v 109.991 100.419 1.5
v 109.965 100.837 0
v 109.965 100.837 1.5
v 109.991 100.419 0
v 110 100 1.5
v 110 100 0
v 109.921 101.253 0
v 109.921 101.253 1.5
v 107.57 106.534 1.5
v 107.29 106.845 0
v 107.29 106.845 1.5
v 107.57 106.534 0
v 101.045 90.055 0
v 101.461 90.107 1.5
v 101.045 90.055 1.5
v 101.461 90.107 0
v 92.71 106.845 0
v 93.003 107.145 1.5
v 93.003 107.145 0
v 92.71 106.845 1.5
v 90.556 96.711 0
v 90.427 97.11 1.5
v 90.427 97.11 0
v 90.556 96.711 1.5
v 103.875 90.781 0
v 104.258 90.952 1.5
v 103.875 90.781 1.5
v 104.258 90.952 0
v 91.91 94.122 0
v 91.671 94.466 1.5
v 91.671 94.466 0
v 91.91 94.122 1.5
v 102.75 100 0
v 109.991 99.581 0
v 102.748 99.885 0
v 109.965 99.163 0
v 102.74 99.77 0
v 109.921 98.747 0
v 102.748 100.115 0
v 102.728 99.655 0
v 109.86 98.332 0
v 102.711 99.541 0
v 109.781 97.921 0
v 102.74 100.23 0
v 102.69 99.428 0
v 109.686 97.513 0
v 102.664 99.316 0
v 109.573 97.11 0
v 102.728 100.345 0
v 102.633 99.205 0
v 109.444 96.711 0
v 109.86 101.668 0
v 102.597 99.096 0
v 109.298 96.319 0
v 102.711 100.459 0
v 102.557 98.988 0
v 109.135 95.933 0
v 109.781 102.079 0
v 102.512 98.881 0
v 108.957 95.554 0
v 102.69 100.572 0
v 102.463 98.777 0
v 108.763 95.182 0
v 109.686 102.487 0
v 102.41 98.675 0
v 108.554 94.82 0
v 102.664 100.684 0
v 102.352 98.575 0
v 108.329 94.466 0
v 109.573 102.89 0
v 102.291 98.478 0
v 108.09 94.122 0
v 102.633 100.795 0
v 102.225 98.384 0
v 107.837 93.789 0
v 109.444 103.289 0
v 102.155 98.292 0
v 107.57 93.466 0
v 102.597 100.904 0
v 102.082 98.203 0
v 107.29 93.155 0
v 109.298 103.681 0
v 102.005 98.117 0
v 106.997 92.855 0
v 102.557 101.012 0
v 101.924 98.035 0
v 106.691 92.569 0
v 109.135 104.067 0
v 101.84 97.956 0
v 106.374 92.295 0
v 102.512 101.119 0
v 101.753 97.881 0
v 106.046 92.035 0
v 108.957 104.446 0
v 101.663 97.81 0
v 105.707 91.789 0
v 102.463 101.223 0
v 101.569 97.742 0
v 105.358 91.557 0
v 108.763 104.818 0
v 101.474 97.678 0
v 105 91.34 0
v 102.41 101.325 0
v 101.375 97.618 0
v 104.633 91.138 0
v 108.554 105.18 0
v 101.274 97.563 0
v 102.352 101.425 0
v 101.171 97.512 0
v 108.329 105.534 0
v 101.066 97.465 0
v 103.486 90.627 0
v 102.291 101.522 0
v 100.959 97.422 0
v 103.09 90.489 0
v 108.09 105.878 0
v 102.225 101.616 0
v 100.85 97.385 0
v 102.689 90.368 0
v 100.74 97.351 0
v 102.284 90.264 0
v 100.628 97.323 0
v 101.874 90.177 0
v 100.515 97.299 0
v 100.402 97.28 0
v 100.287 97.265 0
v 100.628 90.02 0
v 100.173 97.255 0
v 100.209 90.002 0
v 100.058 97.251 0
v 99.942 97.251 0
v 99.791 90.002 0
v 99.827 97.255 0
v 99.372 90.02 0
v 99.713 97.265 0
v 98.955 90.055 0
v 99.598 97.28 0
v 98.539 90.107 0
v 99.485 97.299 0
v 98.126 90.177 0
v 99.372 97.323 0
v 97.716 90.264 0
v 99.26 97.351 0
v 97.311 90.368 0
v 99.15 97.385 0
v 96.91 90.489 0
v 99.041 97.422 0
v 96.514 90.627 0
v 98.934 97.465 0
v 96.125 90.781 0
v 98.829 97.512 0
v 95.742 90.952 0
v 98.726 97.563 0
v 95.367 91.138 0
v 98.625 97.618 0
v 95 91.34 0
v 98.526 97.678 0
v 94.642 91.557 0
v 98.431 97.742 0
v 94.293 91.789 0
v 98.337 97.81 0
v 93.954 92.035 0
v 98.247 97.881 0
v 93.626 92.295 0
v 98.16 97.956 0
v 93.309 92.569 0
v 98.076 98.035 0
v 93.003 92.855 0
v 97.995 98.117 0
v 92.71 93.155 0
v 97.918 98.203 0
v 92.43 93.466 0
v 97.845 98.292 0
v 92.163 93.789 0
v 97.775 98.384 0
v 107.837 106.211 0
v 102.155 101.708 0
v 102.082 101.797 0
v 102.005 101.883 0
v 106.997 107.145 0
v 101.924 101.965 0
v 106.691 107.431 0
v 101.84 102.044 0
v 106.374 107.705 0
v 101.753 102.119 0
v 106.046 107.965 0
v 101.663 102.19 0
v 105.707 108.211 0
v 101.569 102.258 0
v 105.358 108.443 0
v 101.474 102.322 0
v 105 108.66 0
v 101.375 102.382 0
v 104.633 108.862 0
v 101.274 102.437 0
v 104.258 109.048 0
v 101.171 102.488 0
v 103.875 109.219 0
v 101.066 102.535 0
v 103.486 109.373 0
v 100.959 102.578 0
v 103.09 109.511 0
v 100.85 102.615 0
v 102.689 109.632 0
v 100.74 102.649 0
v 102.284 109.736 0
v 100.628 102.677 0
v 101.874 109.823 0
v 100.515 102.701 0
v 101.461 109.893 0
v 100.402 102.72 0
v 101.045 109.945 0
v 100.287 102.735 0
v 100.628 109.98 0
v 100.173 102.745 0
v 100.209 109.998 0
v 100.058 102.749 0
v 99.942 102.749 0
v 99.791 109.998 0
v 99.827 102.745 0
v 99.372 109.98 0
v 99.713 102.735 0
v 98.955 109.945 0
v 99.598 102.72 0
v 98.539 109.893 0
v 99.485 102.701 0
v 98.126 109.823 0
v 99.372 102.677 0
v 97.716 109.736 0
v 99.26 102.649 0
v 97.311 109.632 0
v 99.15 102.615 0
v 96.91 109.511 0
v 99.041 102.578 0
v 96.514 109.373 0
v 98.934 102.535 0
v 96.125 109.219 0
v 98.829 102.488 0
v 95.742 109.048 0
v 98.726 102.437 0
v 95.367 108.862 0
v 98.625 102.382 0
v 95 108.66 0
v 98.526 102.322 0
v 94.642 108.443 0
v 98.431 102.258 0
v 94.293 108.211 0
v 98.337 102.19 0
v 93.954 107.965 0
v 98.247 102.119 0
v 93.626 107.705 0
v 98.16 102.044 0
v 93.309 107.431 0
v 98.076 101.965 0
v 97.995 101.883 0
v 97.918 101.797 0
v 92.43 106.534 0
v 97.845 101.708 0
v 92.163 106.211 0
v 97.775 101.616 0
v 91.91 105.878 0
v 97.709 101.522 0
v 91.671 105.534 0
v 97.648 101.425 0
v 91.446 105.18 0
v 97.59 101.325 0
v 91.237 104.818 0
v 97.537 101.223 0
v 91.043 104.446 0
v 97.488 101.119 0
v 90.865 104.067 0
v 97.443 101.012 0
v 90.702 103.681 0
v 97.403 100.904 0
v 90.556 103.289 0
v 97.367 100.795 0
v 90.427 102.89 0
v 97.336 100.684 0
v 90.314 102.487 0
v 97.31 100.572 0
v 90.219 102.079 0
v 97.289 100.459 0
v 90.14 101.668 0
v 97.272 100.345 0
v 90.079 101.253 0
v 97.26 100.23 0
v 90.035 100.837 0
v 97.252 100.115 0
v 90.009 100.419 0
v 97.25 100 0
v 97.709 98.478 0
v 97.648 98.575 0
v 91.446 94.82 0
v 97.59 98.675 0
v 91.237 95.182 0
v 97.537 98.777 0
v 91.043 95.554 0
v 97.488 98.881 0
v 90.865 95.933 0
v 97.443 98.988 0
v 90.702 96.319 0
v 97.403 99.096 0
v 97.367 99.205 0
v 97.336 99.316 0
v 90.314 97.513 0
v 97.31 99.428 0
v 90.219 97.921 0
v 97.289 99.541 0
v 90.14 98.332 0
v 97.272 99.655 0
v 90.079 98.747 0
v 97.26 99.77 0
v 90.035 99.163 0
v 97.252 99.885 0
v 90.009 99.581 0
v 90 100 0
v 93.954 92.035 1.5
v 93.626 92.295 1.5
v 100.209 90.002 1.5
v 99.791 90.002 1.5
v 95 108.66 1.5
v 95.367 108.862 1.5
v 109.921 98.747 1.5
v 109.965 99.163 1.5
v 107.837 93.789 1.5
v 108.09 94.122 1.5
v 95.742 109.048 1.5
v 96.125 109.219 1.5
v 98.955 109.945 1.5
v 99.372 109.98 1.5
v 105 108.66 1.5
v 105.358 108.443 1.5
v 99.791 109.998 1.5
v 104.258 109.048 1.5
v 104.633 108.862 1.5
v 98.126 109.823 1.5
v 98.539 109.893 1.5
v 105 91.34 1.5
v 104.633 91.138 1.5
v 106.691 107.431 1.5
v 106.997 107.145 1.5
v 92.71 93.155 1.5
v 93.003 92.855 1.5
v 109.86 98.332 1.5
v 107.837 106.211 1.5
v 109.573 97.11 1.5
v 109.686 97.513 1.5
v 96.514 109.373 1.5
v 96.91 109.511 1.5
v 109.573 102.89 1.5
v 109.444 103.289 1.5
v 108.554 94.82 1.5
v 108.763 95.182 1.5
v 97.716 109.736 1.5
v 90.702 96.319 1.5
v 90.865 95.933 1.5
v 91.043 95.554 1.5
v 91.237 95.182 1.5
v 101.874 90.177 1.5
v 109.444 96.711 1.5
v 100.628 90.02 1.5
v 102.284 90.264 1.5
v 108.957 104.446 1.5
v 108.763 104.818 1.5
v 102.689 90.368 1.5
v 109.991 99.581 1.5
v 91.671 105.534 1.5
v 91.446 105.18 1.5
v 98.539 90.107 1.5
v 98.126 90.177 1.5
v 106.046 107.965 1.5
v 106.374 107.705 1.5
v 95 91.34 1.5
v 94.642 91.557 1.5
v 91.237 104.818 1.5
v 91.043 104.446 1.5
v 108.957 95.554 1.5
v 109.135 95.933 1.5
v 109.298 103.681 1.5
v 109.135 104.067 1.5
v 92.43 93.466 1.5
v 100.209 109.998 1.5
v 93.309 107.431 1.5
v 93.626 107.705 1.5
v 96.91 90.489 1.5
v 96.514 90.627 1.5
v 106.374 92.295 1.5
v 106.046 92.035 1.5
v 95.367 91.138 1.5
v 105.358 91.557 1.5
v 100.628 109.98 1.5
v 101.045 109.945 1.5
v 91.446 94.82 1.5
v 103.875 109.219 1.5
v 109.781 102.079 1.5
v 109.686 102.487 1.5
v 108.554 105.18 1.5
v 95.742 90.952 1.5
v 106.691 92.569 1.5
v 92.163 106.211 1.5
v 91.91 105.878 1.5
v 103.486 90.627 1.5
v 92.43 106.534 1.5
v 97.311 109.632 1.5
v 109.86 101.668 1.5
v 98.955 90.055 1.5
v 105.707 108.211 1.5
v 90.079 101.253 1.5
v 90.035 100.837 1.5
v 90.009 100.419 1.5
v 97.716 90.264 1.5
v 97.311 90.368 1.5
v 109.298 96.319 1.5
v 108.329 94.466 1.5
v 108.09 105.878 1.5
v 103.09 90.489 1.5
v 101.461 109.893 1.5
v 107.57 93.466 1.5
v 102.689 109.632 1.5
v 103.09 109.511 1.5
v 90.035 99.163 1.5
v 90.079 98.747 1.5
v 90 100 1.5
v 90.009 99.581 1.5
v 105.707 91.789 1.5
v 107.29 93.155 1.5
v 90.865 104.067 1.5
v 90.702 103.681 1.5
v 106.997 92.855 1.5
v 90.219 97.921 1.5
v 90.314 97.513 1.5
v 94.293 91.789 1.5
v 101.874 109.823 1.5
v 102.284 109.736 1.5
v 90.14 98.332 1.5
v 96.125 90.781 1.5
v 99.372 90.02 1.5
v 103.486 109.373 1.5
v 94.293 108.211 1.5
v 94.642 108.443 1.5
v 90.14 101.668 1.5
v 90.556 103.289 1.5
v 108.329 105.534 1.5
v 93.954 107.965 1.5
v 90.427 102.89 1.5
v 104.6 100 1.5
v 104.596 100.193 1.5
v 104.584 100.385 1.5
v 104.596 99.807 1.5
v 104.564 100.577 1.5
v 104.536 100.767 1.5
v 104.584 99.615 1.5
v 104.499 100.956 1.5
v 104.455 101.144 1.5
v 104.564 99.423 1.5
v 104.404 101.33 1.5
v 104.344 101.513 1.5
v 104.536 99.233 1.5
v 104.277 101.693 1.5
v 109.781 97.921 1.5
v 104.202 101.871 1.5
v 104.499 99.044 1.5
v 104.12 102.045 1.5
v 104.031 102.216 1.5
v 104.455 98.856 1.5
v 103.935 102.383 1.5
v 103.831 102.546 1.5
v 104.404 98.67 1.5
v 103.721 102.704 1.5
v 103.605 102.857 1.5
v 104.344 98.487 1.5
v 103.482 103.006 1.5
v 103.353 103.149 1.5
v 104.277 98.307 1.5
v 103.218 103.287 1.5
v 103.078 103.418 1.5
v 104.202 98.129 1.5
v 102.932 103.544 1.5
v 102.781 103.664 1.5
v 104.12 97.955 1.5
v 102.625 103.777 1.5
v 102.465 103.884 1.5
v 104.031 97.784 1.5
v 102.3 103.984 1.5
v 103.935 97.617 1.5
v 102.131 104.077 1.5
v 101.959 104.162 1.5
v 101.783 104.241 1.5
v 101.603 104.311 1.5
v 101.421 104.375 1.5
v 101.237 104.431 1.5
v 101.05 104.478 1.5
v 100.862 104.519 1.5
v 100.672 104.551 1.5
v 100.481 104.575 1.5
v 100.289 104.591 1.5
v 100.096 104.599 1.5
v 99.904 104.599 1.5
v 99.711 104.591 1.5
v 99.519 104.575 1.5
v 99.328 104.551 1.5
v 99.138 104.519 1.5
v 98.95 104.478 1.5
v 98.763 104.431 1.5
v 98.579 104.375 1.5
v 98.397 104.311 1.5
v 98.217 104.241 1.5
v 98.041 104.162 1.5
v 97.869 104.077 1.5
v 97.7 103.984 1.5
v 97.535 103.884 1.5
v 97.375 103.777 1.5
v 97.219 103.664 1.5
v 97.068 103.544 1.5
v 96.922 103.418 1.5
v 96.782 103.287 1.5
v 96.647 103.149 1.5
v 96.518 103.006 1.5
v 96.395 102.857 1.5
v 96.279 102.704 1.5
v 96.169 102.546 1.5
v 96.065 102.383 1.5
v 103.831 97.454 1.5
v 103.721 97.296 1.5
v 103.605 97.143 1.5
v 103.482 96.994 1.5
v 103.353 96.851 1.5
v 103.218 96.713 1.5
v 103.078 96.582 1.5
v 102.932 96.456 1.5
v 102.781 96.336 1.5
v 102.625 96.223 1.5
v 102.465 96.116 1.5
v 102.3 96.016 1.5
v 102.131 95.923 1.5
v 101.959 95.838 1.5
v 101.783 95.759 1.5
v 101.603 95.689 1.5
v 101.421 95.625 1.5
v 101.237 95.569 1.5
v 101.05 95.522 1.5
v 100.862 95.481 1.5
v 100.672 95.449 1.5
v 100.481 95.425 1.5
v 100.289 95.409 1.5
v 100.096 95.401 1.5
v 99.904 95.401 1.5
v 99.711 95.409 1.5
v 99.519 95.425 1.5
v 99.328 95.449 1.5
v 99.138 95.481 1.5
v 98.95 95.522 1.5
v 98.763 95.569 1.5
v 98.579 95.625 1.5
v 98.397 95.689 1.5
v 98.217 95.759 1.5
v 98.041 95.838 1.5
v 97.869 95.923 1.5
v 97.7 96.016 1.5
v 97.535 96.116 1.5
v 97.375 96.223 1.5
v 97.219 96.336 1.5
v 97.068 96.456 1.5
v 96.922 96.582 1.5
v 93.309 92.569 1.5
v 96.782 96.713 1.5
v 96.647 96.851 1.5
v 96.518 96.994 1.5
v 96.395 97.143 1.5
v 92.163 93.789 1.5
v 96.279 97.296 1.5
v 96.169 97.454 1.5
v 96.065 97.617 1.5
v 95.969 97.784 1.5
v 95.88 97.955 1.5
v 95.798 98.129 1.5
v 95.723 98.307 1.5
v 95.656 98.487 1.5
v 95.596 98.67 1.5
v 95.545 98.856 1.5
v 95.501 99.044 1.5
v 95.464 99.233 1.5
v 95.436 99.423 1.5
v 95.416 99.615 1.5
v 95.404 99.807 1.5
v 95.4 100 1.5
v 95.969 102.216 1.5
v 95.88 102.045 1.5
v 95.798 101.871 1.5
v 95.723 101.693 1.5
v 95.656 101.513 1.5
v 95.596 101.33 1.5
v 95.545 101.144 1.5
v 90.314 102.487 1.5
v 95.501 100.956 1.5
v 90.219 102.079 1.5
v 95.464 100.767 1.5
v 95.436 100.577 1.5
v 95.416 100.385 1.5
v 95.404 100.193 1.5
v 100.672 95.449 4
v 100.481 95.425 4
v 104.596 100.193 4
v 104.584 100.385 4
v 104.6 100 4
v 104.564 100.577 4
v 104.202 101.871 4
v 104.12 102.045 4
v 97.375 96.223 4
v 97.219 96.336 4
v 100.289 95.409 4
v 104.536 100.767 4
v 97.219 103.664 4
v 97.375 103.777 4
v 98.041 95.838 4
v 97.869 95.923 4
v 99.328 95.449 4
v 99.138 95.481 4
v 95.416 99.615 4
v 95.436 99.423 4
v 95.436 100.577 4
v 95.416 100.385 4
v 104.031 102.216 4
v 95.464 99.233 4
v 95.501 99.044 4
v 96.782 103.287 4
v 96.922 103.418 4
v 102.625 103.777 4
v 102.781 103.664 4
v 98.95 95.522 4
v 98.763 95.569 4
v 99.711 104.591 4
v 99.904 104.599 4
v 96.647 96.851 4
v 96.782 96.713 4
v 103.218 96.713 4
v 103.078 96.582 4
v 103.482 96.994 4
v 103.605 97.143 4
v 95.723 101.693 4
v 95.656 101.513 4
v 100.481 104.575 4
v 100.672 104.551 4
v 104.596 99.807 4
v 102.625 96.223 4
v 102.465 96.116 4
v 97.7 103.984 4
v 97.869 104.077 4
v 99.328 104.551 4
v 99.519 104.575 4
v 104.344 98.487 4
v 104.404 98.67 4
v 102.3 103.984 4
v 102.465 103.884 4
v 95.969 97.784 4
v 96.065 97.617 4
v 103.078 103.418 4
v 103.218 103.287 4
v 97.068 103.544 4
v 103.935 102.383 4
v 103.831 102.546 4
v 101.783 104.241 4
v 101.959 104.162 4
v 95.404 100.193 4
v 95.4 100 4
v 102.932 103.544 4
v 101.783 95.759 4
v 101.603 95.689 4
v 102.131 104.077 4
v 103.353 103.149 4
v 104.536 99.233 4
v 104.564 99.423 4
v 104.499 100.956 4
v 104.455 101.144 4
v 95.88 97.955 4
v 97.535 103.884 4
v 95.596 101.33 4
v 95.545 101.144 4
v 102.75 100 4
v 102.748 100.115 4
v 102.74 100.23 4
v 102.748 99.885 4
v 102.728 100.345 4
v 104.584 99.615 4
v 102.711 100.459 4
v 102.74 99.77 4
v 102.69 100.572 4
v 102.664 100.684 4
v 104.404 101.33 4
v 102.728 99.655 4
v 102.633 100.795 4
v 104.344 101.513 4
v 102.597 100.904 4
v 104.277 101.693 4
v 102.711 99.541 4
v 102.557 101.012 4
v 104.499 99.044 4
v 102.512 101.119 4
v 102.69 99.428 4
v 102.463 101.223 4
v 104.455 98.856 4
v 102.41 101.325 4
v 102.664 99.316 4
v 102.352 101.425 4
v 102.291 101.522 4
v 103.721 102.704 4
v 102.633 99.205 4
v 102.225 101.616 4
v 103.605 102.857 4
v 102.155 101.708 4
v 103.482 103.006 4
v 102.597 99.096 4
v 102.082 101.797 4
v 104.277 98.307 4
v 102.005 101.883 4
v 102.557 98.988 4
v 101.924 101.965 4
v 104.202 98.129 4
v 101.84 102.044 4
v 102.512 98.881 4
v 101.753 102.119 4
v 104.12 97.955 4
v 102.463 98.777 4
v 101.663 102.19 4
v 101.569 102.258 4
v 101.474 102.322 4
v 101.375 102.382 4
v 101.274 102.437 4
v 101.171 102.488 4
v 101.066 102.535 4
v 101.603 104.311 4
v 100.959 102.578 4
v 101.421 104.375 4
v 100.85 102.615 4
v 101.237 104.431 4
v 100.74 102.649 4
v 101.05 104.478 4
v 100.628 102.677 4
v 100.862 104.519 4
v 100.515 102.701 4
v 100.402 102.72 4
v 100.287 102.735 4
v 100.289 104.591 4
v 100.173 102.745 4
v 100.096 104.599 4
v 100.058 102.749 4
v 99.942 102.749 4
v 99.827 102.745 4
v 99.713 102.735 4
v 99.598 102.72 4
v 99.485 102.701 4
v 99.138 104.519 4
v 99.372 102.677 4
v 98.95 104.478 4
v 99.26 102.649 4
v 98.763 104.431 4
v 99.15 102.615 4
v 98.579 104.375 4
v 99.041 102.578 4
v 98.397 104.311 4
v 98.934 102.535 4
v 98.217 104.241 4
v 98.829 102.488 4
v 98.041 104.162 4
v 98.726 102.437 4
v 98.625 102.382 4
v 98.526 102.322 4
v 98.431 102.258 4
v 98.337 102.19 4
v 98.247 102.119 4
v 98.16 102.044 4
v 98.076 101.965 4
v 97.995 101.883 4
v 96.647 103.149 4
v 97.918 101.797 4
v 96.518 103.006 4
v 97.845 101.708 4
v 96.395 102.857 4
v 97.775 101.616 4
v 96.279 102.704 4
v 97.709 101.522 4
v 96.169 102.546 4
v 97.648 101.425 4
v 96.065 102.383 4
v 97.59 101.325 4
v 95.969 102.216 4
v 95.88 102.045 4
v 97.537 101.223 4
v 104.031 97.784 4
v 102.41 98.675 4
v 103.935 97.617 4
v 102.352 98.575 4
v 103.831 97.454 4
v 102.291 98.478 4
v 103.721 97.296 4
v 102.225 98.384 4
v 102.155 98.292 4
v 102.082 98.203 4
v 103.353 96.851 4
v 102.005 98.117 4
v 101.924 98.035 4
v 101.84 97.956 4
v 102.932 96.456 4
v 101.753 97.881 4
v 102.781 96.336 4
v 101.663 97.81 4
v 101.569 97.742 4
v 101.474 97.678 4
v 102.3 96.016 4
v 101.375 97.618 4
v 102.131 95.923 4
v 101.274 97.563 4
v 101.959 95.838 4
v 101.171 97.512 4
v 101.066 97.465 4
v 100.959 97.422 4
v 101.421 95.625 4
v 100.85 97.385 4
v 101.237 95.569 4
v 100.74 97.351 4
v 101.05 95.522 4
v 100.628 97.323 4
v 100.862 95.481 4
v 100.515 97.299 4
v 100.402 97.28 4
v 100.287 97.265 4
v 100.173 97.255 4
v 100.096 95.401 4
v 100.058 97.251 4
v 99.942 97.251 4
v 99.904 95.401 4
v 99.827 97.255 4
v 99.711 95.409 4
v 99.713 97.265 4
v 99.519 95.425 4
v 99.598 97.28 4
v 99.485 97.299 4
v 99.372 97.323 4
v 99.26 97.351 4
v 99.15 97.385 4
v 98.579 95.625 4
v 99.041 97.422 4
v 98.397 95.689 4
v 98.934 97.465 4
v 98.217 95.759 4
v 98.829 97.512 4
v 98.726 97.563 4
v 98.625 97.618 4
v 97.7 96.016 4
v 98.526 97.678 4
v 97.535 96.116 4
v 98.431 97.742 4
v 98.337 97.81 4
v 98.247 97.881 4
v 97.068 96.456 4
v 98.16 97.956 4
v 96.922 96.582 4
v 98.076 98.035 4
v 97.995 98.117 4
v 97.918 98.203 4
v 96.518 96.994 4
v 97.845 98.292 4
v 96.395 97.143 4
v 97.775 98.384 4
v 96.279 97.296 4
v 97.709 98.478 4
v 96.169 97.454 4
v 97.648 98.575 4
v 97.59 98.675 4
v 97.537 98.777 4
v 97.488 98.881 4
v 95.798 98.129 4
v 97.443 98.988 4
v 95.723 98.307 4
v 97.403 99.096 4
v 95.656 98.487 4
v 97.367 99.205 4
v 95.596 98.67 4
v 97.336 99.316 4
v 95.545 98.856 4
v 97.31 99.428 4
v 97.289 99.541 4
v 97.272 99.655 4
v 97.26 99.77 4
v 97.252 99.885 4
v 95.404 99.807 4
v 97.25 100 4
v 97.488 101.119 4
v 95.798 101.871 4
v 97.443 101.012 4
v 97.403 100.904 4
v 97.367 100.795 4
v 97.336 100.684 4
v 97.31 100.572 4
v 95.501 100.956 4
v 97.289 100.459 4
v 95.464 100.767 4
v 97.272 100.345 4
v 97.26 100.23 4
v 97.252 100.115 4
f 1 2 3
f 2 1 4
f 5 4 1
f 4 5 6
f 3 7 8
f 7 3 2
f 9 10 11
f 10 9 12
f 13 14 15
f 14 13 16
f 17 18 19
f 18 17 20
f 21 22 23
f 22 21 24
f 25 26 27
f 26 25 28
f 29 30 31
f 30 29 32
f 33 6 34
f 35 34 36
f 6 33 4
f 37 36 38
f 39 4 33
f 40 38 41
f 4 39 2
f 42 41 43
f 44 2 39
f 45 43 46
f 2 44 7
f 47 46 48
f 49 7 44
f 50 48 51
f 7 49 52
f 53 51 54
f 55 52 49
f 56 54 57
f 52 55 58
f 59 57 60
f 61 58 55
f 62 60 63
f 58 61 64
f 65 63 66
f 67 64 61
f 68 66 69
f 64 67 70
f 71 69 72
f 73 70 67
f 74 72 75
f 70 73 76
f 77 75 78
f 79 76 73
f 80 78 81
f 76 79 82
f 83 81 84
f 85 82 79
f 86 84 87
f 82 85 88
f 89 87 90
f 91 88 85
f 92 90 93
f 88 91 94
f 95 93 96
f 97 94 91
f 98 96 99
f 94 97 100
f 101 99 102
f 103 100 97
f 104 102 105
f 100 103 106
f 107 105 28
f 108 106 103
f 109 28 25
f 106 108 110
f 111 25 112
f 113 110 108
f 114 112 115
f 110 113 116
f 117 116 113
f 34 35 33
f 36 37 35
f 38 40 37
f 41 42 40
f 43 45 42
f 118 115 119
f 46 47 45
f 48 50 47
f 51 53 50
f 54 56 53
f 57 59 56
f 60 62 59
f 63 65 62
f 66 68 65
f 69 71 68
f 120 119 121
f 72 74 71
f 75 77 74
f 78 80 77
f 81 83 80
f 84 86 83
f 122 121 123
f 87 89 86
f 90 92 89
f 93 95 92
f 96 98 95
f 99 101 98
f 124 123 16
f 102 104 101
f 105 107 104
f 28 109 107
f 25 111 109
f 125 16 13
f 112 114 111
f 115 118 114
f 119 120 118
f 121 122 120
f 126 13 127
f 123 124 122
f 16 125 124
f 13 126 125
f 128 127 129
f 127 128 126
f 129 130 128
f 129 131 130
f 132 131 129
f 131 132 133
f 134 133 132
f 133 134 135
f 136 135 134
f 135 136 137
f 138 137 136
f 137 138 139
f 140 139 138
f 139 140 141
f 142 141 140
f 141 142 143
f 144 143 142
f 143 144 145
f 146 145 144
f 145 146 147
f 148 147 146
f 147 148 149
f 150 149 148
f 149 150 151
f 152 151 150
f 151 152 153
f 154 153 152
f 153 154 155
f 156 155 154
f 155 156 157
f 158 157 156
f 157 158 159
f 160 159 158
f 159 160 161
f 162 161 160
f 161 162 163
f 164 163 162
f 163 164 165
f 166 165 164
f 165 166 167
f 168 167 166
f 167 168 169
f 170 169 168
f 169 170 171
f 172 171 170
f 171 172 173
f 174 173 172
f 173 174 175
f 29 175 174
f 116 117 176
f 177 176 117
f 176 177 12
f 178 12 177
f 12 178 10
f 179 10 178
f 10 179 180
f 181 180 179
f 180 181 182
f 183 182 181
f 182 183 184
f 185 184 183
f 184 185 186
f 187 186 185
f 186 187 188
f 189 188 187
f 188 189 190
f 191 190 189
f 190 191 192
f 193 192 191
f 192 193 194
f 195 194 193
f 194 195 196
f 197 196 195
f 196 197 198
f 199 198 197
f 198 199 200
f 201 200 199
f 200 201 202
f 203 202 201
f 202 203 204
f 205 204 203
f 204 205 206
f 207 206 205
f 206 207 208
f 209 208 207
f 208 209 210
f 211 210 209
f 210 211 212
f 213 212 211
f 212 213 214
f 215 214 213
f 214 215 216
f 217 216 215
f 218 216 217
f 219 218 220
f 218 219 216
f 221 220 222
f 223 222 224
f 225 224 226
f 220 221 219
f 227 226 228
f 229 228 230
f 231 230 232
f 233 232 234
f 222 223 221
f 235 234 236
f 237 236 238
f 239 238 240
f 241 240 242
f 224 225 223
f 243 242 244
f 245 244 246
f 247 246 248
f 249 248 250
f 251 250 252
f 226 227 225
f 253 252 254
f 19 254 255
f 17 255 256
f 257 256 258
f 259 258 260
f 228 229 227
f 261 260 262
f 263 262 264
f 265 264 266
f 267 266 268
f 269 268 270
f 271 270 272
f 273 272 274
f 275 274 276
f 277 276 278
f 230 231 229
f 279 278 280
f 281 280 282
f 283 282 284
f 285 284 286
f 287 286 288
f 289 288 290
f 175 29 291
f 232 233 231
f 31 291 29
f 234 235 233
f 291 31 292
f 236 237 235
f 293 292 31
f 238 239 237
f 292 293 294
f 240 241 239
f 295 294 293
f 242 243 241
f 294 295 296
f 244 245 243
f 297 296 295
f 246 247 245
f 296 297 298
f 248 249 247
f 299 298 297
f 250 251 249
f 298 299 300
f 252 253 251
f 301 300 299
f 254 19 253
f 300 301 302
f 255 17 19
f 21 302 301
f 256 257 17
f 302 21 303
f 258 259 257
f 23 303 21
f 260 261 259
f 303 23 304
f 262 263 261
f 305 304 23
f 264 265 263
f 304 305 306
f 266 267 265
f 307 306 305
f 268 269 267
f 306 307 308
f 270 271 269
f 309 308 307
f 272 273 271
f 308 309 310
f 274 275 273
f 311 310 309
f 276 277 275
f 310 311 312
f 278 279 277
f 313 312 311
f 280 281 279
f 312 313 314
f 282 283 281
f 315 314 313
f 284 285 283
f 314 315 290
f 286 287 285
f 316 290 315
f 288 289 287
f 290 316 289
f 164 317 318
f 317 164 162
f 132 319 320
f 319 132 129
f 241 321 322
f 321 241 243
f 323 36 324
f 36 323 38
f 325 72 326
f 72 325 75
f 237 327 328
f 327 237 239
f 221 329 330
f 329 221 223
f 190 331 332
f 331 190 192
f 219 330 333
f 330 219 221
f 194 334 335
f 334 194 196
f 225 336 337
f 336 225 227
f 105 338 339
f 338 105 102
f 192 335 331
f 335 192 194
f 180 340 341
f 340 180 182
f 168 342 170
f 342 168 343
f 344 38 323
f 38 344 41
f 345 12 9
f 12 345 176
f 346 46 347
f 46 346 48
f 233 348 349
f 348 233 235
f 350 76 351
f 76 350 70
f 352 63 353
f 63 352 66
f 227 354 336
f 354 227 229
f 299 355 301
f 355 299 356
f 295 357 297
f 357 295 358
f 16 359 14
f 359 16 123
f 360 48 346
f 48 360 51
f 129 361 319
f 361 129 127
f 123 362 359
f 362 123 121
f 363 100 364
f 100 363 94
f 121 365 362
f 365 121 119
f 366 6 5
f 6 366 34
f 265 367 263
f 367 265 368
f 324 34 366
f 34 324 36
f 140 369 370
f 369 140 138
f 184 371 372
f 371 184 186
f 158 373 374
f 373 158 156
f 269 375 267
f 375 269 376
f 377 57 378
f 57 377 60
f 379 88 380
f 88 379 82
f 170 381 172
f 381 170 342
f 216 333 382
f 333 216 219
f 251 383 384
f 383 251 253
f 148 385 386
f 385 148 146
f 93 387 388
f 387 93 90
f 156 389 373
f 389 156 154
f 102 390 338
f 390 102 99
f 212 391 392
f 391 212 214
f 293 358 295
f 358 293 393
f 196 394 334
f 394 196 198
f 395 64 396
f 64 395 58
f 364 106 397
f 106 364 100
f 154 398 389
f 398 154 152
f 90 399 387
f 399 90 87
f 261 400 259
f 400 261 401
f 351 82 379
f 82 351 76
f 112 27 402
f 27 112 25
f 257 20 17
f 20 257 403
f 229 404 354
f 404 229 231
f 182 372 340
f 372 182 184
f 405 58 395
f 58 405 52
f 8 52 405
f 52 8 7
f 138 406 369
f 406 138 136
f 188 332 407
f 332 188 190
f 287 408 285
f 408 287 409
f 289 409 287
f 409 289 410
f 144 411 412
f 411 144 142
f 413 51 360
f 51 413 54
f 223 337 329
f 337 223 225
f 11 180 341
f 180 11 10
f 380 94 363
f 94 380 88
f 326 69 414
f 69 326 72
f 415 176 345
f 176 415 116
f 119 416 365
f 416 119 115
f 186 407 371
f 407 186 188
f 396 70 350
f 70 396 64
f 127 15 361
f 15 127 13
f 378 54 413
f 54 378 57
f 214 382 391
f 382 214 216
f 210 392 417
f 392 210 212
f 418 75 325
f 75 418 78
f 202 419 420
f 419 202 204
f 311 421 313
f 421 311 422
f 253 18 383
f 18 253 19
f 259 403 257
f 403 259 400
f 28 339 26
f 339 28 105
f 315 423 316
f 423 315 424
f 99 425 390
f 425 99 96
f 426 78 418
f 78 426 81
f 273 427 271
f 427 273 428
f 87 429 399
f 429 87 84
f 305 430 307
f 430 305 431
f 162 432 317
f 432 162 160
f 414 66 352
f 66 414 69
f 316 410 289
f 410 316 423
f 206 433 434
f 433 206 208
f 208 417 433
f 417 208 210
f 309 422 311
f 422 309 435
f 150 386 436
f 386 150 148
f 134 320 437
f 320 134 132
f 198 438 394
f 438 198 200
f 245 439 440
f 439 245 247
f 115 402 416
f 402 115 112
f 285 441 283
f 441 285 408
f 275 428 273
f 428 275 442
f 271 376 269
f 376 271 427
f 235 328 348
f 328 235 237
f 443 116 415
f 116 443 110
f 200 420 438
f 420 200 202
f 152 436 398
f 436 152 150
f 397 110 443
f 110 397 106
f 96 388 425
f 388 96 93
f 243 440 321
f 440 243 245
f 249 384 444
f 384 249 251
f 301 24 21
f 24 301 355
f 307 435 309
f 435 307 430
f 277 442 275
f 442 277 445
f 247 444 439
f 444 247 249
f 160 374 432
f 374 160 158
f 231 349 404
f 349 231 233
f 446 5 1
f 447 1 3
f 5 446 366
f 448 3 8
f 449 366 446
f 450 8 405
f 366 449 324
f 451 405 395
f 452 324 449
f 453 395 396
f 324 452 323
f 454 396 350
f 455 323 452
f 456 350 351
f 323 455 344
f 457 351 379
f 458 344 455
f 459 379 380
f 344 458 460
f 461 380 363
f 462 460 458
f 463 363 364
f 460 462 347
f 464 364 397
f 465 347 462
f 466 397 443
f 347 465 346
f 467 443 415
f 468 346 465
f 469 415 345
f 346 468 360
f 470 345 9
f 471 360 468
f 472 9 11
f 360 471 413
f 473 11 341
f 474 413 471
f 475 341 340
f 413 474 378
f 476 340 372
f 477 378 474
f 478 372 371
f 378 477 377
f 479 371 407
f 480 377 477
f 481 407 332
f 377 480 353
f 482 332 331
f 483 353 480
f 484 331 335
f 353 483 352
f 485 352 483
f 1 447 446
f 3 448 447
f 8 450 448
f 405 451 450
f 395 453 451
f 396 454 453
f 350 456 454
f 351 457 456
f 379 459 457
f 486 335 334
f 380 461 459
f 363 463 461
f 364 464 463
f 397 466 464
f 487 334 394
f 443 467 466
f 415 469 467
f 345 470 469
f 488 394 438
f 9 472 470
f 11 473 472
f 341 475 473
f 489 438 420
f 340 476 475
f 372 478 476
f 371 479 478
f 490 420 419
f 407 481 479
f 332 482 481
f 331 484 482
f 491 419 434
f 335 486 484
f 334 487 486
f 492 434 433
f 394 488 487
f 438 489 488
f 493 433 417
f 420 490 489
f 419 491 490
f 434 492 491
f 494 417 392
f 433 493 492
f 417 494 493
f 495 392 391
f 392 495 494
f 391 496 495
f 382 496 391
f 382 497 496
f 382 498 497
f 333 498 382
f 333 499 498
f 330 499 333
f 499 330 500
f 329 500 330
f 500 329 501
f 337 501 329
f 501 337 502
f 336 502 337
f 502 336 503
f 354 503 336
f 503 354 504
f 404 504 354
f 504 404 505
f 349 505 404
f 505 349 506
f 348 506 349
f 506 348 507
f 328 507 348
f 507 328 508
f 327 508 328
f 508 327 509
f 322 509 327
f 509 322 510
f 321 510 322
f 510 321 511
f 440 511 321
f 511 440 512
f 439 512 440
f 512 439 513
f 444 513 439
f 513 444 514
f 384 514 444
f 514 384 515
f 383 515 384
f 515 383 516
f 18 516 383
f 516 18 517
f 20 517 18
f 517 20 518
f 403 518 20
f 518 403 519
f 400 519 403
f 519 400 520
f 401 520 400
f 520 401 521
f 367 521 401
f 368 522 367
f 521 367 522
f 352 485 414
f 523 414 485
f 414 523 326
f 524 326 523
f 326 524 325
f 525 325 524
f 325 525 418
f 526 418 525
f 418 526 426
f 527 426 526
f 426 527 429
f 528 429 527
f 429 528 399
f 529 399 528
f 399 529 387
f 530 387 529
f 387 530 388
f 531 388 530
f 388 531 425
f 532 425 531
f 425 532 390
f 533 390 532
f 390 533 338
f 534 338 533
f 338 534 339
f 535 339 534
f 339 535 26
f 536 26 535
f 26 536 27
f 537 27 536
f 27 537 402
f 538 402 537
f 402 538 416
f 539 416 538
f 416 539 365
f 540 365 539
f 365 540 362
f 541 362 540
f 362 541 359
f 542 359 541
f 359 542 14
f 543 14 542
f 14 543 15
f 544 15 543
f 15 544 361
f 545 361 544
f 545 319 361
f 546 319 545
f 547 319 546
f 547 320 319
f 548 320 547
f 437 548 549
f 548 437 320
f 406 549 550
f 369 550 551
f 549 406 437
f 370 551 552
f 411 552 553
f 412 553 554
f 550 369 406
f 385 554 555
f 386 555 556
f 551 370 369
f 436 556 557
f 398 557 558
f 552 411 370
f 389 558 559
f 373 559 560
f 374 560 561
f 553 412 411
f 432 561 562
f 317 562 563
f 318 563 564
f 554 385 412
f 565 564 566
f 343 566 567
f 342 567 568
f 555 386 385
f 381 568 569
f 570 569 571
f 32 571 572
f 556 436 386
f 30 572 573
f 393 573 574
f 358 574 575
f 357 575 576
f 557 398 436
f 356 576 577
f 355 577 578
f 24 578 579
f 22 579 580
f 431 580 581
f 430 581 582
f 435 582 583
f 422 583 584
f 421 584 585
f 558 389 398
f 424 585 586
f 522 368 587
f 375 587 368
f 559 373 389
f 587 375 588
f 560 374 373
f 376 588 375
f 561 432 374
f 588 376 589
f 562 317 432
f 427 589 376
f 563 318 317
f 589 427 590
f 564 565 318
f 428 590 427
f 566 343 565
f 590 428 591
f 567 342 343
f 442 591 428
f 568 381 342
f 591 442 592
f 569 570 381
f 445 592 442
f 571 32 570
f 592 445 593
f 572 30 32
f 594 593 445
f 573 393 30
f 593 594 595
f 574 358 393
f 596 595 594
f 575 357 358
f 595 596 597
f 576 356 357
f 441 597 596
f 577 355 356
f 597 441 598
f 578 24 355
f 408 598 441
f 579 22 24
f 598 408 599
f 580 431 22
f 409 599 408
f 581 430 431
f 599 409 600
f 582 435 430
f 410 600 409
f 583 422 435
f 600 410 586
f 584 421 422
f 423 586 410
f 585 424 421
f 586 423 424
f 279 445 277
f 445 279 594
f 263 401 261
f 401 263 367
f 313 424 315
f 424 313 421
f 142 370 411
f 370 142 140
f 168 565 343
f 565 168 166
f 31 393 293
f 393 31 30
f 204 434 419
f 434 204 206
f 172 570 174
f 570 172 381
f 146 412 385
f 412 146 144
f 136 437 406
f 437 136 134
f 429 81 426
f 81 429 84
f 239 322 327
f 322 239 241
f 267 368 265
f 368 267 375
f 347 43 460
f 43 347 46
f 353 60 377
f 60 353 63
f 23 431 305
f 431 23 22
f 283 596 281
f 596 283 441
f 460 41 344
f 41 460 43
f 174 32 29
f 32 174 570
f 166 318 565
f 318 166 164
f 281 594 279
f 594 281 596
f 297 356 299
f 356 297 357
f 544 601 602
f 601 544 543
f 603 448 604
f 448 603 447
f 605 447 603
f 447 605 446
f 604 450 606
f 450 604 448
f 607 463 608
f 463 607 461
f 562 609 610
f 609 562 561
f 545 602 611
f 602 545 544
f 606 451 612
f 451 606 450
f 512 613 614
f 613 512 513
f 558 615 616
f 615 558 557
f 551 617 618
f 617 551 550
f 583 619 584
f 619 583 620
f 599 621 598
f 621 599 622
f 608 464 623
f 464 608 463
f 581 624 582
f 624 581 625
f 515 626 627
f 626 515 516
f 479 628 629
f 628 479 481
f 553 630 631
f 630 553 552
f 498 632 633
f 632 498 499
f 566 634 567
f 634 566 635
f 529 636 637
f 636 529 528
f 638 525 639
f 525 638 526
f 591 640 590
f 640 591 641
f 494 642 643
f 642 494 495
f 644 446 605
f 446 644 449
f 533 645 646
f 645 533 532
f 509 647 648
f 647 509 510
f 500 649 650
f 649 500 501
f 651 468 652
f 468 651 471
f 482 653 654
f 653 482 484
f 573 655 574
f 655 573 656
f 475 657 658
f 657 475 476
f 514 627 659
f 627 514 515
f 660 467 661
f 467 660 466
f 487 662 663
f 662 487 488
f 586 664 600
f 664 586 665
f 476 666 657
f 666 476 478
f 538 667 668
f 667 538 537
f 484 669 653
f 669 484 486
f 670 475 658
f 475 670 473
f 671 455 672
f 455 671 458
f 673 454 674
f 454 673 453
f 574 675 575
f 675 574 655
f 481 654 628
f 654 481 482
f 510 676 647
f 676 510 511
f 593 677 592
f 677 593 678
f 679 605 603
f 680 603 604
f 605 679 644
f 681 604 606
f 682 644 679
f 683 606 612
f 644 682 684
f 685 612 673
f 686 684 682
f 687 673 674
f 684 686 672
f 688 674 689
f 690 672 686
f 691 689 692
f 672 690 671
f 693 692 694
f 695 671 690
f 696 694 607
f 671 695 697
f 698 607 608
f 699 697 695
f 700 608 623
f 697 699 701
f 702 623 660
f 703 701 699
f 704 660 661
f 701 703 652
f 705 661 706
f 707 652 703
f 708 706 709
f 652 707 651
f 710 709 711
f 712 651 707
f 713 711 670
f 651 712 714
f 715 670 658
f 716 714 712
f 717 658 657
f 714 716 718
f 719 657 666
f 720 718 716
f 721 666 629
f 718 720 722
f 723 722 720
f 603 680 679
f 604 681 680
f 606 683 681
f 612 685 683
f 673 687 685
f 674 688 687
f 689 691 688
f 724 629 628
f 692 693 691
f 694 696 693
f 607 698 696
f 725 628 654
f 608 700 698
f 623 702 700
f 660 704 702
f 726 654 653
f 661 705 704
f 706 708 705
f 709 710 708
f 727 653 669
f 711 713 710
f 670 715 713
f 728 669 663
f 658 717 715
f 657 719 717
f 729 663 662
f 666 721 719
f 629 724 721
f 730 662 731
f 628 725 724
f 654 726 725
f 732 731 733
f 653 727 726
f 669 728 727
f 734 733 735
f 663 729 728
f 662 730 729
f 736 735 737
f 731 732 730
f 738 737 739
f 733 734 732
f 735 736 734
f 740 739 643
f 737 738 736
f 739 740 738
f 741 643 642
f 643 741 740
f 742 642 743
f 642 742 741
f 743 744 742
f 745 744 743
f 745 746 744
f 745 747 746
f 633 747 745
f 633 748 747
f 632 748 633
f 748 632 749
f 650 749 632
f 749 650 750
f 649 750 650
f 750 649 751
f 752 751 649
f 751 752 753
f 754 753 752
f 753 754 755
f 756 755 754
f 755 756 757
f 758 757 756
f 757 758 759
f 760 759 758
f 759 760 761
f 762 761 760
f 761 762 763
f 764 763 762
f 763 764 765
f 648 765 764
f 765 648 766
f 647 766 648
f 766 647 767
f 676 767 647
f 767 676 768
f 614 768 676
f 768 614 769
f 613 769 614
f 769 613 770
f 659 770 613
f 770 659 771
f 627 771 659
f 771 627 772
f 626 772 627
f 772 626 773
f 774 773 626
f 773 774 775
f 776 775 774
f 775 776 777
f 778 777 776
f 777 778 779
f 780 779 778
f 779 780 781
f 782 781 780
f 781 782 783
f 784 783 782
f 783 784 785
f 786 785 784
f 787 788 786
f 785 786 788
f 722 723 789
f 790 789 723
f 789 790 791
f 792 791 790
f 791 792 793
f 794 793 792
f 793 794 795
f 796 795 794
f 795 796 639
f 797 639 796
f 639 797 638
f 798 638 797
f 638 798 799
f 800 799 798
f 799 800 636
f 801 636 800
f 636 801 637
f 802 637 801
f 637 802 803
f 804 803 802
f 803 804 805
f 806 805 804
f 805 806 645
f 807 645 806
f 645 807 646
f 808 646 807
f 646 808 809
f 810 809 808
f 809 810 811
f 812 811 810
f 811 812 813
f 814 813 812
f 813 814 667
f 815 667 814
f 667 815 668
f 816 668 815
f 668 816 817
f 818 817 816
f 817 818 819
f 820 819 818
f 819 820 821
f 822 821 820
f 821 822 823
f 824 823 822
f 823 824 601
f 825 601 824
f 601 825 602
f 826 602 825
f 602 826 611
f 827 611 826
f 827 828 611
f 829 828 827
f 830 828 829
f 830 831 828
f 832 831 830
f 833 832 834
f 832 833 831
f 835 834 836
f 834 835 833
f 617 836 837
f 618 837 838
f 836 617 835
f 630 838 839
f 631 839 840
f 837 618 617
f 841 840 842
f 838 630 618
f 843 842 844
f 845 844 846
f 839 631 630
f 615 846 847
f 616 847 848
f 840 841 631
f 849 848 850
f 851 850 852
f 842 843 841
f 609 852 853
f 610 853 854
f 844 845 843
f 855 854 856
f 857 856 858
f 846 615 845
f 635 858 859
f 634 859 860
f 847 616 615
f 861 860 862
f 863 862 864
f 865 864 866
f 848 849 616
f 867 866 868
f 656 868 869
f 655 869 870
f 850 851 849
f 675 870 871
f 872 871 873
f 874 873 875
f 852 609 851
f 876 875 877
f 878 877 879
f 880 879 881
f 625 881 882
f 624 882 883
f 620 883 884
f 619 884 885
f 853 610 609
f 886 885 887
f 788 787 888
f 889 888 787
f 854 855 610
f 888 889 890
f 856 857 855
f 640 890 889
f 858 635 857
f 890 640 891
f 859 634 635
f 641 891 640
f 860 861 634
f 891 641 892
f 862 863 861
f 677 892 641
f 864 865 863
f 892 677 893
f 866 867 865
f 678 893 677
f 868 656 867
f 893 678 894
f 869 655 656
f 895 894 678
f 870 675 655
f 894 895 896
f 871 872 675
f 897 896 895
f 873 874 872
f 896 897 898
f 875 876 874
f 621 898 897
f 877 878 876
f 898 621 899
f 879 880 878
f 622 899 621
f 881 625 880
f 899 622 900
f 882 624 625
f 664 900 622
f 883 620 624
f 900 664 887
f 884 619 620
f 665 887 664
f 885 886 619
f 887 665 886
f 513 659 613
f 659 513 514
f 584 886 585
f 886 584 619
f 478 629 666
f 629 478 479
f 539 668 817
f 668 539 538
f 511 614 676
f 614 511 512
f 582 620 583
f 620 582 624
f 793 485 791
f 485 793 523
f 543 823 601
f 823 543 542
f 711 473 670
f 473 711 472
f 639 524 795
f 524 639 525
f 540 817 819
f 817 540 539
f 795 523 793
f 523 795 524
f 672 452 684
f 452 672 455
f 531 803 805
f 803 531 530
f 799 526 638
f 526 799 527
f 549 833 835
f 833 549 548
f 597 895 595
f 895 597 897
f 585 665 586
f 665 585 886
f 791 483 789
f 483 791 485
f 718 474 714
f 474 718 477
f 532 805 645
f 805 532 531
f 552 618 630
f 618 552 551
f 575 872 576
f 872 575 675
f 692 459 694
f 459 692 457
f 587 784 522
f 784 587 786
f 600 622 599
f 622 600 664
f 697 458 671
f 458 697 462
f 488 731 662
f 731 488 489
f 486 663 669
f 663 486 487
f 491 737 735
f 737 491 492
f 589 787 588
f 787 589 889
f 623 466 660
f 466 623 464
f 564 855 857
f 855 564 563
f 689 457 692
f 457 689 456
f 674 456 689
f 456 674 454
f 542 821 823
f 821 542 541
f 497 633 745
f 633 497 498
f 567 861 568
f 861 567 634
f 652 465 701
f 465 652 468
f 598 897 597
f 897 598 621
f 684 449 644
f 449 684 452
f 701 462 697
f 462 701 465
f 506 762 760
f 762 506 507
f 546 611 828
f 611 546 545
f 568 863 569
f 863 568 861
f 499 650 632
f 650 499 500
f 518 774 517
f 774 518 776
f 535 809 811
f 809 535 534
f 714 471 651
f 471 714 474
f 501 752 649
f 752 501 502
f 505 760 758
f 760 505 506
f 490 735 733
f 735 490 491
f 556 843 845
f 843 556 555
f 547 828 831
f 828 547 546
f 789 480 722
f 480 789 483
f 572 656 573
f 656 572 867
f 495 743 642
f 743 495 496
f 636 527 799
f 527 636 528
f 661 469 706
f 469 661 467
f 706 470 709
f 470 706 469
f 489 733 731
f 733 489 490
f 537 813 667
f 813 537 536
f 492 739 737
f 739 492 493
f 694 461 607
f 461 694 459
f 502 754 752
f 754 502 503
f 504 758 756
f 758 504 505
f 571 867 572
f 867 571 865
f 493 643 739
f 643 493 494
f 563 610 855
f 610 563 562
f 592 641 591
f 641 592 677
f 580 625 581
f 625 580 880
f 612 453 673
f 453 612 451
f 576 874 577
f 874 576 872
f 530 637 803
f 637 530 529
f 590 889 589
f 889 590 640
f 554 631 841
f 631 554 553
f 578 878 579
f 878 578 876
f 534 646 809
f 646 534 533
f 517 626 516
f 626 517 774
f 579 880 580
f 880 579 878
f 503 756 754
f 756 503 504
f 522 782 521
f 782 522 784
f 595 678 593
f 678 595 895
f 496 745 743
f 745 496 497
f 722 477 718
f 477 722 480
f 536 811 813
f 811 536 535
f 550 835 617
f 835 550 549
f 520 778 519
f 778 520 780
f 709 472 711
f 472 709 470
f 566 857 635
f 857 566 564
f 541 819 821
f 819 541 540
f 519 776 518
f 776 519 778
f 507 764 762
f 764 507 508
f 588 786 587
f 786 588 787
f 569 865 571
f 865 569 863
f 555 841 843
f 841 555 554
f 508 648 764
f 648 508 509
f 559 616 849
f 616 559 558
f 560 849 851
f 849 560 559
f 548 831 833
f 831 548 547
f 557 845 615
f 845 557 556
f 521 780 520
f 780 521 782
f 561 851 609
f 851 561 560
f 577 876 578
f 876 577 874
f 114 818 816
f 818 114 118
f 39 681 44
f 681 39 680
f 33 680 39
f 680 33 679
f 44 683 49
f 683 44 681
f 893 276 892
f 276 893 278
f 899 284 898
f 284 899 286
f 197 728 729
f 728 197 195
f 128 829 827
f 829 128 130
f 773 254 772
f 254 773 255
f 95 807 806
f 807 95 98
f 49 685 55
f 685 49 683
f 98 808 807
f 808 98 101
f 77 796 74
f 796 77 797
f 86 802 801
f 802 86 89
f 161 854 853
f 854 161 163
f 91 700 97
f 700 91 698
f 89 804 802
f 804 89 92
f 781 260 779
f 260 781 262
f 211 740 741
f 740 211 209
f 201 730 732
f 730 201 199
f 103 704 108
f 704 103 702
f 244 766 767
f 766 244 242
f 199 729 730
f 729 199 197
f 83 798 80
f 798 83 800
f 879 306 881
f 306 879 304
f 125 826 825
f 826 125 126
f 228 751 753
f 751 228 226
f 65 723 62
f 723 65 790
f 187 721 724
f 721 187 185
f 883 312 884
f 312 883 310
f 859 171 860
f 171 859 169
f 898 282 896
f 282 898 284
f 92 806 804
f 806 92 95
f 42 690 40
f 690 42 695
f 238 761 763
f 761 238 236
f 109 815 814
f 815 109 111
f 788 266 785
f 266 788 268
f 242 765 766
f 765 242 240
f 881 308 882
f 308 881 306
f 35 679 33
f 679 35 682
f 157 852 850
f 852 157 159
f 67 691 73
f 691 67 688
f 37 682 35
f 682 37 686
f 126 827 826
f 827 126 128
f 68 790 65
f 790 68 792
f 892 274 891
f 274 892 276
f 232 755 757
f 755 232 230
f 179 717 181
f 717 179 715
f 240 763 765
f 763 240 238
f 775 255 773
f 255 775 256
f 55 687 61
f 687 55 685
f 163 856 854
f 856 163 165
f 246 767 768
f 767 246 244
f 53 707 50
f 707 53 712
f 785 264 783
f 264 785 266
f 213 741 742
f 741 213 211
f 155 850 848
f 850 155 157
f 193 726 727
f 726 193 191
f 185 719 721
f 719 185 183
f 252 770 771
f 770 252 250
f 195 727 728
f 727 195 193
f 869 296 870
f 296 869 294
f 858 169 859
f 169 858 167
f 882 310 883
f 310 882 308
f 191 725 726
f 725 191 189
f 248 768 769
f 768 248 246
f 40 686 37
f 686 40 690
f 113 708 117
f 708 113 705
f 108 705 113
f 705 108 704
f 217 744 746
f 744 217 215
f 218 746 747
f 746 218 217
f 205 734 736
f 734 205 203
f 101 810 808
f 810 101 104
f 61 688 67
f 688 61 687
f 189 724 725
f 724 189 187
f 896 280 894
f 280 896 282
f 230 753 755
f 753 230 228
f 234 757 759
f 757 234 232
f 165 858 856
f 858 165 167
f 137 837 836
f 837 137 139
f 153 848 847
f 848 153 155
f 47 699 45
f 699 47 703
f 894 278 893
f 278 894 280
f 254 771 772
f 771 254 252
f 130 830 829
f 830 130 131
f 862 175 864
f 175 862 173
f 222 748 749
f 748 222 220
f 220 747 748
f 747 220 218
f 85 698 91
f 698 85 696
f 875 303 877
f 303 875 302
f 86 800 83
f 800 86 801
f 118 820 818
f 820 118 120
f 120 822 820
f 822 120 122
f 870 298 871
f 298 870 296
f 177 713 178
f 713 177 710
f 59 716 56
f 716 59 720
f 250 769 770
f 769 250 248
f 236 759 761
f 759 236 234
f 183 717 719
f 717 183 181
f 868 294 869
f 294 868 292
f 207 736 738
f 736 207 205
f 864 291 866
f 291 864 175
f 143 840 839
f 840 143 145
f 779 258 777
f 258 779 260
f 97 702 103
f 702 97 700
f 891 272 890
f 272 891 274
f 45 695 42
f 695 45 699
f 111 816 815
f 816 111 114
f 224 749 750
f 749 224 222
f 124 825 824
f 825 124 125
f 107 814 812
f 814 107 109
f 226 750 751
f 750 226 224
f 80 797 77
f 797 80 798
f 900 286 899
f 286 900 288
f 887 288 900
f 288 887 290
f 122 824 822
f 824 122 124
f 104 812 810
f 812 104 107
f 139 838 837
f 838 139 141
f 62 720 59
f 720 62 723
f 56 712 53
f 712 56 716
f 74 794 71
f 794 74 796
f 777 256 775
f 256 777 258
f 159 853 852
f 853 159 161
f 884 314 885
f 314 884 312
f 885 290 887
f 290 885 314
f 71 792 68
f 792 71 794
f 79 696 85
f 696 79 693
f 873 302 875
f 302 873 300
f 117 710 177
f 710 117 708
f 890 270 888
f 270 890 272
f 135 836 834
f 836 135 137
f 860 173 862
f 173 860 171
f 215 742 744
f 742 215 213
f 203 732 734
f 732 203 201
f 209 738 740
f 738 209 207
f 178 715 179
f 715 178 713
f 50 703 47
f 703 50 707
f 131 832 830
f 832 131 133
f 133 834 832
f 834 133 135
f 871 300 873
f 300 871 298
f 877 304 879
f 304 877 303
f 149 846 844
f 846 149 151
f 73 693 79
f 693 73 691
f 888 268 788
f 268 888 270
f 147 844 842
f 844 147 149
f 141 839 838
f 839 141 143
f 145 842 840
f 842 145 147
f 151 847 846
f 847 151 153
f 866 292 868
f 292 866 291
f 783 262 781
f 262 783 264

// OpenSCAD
//diameter (shaft) [0.1mm]  0 - no hole inside -> use for cap
inner = 55; //[0:60]
    
//diameter (hole in motor body) [0.1mm] 
hole = 92; //[40:150]  
    
//ring [mm]   
outer = 20; //[10:40]   

//ring [0.1mm]
heigh_outer = 15; //[10:40]     

// [0.1mm]
heigh_hole = 25; //[10:40]    

translate([100,100,0])
difference() {
    union(){
        //base ring
        cylinder(heigh_outer/10, d=outer, $fn=150);
        //hole
        cylinder((heigh_outer + heigh_hole)/10, d=hole/10, $fn=150);
    }
    //shaft
    cylinder((heigh_outer + heigh_hole)/10, d=inner/10, $fn=150);
}
